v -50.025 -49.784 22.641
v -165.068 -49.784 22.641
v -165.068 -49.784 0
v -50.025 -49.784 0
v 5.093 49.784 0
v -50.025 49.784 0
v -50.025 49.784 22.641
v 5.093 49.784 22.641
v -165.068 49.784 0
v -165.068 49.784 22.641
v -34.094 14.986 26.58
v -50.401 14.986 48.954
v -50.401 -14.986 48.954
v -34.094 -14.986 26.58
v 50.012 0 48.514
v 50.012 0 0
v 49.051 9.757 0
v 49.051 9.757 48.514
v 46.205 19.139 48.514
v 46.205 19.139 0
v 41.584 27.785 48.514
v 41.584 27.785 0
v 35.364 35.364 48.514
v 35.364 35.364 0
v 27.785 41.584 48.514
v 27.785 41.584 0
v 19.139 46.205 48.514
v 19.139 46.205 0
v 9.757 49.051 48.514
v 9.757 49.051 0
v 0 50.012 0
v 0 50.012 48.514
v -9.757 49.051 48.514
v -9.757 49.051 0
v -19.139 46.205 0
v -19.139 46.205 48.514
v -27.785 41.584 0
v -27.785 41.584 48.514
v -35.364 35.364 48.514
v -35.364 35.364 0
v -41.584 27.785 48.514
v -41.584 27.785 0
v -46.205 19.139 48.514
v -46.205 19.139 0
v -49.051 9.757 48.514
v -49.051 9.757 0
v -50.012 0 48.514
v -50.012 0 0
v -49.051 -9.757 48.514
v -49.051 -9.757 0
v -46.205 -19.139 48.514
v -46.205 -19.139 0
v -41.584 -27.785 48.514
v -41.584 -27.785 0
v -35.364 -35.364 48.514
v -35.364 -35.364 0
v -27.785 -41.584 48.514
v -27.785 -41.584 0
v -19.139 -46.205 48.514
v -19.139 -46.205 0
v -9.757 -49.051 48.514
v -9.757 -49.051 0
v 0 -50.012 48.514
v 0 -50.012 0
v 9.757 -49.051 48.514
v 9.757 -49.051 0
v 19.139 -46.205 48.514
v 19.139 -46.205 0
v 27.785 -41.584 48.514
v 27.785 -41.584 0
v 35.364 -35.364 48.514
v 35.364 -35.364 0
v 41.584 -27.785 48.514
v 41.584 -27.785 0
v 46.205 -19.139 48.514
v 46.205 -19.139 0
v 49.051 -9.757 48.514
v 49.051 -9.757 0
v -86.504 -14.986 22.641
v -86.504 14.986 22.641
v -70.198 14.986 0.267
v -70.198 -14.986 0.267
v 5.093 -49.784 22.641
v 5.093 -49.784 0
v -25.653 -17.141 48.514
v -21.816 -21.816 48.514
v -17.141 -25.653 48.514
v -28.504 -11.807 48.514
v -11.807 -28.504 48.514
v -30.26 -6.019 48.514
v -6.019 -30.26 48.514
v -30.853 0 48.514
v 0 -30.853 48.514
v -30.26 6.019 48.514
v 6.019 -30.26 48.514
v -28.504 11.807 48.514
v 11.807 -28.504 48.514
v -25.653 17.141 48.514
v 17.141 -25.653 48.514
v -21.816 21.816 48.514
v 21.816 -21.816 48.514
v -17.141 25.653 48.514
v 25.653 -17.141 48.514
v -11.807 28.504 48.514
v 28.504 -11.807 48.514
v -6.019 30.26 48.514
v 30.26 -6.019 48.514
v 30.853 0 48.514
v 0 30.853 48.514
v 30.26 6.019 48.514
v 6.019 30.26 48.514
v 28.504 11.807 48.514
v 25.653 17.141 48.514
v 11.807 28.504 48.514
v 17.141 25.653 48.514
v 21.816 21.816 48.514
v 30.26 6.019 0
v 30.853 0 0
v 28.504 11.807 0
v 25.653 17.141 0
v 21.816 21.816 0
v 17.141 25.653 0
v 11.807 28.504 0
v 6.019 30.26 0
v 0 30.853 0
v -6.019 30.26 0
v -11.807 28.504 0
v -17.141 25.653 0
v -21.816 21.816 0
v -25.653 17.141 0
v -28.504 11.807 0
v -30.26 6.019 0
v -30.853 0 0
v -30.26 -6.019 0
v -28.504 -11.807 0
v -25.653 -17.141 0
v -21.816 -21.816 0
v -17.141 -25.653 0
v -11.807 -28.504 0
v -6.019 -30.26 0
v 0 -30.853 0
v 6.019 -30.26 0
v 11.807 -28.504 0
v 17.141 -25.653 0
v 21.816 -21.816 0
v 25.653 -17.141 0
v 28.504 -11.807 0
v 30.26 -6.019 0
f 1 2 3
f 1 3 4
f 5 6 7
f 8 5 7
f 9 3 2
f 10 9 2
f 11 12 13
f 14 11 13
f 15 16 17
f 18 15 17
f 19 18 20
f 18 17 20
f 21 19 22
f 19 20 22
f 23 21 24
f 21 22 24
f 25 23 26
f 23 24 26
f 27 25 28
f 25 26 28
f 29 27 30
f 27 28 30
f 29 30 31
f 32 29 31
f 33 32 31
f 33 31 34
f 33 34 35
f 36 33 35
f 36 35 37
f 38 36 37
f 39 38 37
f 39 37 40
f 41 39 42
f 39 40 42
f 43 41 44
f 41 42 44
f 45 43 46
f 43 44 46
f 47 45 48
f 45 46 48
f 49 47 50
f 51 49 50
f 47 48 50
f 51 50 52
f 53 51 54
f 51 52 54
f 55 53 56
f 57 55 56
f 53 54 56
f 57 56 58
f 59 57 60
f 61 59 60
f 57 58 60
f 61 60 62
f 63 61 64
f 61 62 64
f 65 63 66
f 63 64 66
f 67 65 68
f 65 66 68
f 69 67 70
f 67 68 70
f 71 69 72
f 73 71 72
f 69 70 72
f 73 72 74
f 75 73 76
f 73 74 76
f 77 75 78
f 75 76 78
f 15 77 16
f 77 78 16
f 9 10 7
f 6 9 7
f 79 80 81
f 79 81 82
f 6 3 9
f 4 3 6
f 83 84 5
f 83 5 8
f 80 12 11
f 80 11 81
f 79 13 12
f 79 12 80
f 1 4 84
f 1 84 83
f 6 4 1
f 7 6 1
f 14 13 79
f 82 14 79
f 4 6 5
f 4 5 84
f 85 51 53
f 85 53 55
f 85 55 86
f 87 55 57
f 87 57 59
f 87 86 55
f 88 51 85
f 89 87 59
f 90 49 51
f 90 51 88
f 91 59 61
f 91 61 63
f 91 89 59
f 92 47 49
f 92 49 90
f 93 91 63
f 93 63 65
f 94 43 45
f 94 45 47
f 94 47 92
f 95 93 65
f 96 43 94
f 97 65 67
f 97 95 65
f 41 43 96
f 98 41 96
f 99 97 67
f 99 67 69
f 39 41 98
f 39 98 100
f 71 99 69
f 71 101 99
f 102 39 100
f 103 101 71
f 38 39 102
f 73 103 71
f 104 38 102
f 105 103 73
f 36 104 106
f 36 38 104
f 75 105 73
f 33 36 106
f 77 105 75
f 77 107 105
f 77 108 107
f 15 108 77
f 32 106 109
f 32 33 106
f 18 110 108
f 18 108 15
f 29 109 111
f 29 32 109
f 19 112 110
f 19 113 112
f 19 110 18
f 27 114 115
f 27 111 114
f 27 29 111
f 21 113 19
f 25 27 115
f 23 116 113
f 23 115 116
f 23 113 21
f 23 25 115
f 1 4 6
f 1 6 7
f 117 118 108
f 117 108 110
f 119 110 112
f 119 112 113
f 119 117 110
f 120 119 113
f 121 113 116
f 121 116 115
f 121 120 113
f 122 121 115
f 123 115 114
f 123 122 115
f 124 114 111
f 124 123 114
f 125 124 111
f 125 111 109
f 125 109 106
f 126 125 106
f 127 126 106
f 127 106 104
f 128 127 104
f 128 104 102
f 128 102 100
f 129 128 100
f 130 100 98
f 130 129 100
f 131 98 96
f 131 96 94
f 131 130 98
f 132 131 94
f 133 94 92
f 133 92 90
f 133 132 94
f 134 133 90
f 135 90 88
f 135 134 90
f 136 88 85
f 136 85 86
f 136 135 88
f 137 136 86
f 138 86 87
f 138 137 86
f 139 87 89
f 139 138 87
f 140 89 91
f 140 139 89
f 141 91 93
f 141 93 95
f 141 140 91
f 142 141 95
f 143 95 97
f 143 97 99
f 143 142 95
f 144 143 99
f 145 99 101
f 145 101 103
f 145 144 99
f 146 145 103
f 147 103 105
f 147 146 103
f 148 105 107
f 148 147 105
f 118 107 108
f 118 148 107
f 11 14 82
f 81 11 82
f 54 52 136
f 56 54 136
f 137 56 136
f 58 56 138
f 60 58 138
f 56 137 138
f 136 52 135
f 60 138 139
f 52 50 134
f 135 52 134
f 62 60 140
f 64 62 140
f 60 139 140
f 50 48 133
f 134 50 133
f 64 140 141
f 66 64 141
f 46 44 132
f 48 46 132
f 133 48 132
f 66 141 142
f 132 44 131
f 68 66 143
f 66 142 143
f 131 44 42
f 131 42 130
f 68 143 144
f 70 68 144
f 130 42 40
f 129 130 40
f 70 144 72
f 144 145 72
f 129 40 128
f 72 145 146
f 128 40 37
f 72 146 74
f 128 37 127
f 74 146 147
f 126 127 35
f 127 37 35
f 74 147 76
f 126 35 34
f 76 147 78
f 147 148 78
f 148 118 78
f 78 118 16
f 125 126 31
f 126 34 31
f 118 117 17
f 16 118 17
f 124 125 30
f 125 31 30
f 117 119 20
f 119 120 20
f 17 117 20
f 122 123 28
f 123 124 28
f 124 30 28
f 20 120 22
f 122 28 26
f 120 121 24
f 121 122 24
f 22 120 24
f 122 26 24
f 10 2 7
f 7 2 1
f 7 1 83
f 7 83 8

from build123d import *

# Parameters (mm, degrees)
F0_R     = 50.0122703422
F0_R_2   = 30.8528794084
F1_DEPTH = 48.514
F2_W     = 115.0430589914
F2_H     = 22.641453892
F3_DEPTH = 49.784
F4_DEPTH = 55.118
F6_E3_W  = 44.6751625542
F6_E3_H  = 29.972
F7_DEPTH = 27.686


with BuildPart() as f1:
    # F0 (on Top) → F1 (new body)
    with BuildSketch(Plane.XY):
        Circle(F0_R)
        Circle(F0_R_2, mode=Mode.SUBTRACT)
    extrude(amount=F1_DEPTH)


with BuildPart() as f3:
    # F2 (on Front) → F3 (new body, symmetric)
    with BuildSketch(Plane.XZ):
        with Locations((-107.546903193, 11.320726946)):
            Rectangle(F2_W, F2_H)
    extrude(amount=F3_DEPTH, both=True)


with BuildPart() as f4:
    # F4 (new): a face of the model
    f4_faces = [f3.part.faces().sort_by_distance(p)[0] for p in [
        (-50.0253736973, 0, 11.320726946),
    ]]
    extrude(f4_faces, amount=F4_DEPTH)


with BuildPart() as f7:
    # F6_E3 (on explicit) → F7 (new body)
    with BuildSketch(Plane(origin=(-50.4005476832, 14.986, 48.9544942975), x_dir=(-0.8081433169, 0, -0.5889858906), z_dir=(-0.5889858906, 0, 0.8081433169))):
        with Locations((22.3375812771, 14.986)):
            Rectangle(F6_E3_W, F6_E3_H)
    extrude(amount=-F7_DEPTH)


solid = Compound([f1.part, f3.part, f4.part, f7.part])
